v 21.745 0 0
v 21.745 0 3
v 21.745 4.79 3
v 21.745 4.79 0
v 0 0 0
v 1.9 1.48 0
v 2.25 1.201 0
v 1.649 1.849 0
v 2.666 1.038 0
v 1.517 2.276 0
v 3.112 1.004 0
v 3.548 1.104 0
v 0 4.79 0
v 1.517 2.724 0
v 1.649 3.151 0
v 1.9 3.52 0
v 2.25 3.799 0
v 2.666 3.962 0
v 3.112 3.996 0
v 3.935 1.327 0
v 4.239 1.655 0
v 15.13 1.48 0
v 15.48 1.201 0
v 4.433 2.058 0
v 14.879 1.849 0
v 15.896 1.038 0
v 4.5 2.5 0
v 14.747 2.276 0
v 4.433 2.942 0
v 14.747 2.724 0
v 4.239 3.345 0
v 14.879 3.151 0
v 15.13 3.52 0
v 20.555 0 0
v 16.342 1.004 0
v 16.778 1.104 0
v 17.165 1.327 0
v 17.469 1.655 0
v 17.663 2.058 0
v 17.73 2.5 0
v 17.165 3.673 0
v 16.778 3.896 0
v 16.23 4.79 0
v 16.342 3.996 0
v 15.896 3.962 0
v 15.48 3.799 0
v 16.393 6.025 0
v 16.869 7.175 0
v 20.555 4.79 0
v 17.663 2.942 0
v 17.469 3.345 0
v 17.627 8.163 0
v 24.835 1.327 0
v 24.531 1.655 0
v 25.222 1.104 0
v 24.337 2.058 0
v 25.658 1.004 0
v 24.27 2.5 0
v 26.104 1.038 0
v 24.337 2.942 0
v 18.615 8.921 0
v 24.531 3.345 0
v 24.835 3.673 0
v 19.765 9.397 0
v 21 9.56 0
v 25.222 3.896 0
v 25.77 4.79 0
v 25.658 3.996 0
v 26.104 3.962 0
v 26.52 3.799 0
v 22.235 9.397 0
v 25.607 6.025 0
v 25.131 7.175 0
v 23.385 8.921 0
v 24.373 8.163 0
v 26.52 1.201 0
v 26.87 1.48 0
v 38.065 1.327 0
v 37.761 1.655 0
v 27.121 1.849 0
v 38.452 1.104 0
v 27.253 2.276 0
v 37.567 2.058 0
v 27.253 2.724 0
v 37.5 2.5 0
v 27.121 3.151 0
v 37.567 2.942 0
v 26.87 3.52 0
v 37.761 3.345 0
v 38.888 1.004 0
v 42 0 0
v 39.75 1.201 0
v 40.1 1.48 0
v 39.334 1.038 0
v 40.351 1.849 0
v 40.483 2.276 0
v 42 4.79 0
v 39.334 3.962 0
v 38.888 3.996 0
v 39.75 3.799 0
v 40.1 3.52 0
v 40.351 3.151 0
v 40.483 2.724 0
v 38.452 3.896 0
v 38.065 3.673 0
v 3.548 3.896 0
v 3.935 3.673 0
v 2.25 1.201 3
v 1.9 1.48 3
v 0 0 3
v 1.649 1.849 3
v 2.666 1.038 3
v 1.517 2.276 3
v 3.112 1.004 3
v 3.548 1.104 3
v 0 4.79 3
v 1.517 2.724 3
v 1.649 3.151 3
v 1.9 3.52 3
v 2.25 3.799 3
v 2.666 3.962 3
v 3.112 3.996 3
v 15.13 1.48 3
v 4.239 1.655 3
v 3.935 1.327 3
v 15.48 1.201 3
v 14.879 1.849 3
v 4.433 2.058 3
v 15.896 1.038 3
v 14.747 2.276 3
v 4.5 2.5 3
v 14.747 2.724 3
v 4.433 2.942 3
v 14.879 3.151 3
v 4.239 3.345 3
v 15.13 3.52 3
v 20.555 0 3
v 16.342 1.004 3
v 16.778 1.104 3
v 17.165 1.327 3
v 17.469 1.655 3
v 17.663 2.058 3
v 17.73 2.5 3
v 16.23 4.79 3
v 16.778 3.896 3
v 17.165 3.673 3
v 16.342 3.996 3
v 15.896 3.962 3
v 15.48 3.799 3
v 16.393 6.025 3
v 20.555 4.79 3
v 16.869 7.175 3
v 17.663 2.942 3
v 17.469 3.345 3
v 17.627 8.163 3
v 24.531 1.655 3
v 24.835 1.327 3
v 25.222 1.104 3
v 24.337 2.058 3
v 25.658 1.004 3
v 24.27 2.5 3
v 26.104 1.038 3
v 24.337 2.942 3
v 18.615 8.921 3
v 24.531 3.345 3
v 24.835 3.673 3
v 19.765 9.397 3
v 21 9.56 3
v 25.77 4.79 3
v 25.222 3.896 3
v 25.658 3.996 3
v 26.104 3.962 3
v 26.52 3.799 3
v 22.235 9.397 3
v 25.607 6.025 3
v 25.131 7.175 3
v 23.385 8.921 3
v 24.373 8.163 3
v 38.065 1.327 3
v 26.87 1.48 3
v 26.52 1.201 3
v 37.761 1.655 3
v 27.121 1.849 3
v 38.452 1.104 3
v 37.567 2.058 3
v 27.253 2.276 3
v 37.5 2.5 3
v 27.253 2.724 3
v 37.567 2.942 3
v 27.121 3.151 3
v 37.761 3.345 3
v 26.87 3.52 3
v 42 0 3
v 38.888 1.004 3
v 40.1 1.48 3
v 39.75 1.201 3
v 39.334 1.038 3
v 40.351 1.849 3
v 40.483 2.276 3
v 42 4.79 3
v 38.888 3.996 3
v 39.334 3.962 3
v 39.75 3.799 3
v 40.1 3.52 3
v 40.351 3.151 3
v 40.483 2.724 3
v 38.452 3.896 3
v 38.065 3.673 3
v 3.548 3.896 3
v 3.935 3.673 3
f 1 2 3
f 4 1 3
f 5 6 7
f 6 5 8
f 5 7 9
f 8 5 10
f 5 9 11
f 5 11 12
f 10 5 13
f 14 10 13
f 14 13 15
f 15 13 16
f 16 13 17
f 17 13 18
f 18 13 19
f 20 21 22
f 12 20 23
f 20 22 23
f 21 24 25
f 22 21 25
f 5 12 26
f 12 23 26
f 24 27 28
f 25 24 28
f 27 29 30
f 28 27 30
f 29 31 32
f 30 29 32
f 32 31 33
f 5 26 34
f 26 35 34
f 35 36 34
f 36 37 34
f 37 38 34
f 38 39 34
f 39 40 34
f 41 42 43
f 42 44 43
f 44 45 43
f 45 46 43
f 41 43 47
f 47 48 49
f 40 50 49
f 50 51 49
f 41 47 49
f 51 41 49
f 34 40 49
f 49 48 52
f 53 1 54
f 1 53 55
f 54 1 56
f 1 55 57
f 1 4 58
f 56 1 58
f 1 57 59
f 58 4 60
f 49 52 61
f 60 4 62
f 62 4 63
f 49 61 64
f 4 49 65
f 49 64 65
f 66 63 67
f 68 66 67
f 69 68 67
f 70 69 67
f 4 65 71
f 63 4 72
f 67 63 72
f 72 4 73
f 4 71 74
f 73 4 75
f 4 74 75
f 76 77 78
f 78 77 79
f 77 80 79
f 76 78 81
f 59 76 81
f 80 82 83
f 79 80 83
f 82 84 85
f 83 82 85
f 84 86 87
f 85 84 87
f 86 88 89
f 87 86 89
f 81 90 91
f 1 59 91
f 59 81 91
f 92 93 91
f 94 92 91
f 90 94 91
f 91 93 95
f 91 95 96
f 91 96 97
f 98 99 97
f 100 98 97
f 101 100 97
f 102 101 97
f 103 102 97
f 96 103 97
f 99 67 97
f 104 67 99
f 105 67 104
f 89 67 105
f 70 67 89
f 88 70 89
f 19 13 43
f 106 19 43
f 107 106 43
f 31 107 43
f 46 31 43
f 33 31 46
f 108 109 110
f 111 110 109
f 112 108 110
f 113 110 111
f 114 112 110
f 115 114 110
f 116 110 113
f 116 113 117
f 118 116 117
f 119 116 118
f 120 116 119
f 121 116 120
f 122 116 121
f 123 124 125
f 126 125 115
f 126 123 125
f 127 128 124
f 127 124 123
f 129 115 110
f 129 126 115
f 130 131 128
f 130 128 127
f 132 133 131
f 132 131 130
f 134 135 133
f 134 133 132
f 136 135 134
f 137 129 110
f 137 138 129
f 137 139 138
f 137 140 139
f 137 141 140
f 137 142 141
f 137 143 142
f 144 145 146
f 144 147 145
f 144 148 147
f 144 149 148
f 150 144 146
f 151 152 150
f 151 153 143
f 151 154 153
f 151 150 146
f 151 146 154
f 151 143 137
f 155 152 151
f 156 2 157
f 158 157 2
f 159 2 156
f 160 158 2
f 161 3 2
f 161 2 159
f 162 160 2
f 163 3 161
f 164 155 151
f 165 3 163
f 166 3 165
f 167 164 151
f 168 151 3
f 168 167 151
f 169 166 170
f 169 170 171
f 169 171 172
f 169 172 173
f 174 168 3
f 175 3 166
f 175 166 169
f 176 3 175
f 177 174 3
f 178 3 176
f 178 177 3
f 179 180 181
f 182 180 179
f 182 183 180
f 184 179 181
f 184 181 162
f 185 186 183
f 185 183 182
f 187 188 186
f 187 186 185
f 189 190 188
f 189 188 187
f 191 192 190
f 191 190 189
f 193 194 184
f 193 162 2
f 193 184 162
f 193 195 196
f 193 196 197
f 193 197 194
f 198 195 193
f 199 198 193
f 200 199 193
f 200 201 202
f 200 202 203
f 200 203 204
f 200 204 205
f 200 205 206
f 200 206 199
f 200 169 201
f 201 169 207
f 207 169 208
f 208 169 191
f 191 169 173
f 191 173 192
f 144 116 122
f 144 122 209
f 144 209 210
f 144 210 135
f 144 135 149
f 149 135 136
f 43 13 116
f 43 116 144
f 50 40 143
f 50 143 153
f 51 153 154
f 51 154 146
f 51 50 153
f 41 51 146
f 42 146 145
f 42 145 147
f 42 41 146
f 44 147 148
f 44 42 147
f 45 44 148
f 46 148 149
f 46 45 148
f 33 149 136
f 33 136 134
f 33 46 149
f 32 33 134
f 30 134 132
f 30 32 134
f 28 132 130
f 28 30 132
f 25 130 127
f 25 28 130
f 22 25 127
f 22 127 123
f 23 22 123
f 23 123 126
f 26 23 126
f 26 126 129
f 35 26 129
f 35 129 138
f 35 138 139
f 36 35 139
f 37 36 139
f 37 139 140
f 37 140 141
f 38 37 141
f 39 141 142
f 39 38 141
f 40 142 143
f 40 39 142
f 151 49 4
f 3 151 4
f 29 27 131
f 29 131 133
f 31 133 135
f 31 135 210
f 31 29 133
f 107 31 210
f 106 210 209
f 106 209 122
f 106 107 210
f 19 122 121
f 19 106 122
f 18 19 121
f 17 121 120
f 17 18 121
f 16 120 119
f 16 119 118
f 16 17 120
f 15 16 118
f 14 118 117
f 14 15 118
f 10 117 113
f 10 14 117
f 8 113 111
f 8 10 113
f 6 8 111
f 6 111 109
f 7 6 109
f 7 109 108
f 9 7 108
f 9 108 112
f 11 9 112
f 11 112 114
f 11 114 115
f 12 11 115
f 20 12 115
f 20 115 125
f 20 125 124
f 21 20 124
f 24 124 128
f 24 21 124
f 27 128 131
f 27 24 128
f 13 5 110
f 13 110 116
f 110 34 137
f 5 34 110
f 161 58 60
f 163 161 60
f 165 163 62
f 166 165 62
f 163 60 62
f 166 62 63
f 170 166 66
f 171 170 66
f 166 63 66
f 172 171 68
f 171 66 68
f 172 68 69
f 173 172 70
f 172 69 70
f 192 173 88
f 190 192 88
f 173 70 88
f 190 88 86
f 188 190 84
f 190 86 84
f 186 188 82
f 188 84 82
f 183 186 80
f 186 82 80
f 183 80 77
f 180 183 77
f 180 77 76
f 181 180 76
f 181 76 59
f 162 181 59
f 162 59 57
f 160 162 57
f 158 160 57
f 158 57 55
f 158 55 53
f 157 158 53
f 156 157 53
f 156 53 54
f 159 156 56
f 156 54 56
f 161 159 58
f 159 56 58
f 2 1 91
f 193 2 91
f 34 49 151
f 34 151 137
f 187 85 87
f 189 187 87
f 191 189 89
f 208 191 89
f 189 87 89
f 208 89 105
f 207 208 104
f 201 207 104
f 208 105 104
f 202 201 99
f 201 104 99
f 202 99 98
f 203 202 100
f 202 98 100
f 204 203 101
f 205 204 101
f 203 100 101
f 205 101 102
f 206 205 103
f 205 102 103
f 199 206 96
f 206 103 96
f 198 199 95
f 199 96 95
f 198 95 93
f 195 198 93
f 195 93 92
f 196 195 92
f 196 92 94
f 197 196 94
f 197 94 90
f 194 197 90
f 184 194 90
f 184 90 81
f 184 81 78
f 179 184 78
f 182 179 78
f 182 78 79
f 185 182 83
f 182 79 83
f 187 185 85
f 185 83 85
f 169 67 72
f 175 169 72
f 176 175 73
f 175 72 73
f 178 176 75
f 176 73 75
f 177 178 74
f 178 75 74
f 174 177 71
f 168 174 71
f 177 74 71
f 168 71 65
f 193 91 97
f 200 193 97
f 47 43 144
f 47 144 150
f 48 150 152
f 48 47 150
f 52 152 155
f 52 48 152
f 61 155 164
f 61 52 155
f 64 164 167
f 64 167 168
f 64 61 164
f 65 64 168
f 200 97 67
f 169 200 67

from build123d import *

# Parameters (mm, degrees)
SKETCH1_R           = 1.5
BOSS_EXTRUDE1_DEPTH = 3
SKETCH2_W           = 1.19
SKETCH2_H           = 4.79
CUT_EXTRUDE1_DEPTH  = 10


with BuildPart() as part:
    # Sketch1 → Boss-Extrude1 (new body)
    with BuildSketch(Plane.XY):
        with BuildLine():
            Line((20.555, 4.79), (20.555, 0))
            Line((20.555, 0), (0, 0))
            Line((0, 0), (0, 4.79))
            Line((0, 4.79), (16.23, 4.79))
            ThreePointArc((16.23, 4.79), (17.627100654, 8.162899346), (21, 9.56))
            Line((21, 9.56), (21, 4.79))
            Line((21, 4.79), (20.555, 4.79))
        make_face()
        with Locations((3, 2.5)):
            Circle(SKETCH1_R, mode=Mode.SUBTRACT)
        with Locations((16.23, 2.5)):
            Circle(SKETCH1_R, mode=Mode.SUBTRACT)
    boss_extrude1 = extrude(amount=BOSS_EXTRUDE1_DEPTH)

    # Mirror1: Boss-Extrude1 across plane
    add(boss_extrude1.mirror(Plane(origin=(21, 9.56, 3), x_dir=(0, 0, 1), z_dir=(-1, 0, 0))))

    # Sketch2 → Cut-Extrude1 (cut)
    with BuildSketch(Plane.XY.offset(3)):
        with Locations((21.15, 2.395)):
            Rectangle(SKETCH2_W, SKETCH2_H)
    extrude(amount=-CUT_EXTRUDE1_DEPTH, mode=Mode.SUBTRACT)


solid = part.part
